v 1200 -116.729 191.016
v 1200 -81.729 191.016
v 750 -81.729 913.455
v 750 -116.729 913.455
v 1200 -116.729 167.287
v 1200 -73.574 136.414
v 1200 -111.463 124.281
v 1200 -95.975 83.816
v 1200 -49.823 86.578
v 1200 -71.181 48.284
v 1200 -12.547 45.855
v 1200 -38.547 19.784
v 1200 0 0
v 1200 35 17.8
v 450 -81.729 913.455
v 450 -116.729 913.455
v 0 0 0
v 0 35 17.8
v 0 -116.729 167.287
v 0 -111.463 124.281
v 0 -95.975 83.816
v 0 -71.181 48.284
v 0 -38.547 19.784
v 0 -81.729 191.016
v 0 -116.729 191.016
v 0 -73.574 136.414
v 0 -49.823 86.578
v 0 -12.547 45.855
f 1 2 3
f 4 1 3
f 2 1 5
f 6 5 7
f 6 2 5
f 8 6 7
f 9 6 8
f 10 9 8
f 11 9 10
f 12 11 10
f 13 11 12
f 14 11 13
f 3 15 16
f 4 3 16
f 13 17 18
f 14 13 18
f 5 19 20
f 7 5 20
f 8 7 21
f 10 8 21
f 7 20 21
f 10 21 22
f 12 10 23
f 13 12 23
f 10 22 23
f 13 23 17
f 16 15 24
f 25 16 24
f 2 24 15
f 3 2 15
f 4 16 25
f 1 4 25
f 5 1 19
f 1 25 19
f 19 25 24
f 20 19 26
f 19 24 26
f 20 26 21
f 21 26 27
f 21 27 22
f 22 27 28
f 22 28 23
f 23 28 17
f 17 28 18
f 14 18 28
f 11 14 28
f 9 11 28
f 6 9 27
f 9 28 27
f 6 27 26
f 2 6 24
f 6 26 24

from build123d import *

# Parameters (mm, degrees)
BOSS_EXTRUDE2_DEPTH = 1200
CUT_EXTRUDE2_DEPTH  = 1200


with BuildPart() as part:
    # Sketch4 → Boss-Extrude2 (new body)
    with BuildSketch(Plane(origin=(0, 0, 0), x_dir=(0, 0, -1), z_dir=(1, 0, 0))):
        with BuildLine():
            Line((-418.085663079, -116.728740424), (-167.287455413, -116.728740424))
            ThreePointArc((-167.287455413, -116.728740424), (-65.293961038, -84.661970634), (0, 0))
            Line((0, 0), (-17.8, 35))
            ThreePointArc((-17.8, 35), (-86.57752002, -49.822987688), (-191.015585124, -81.728740424))
            Line((-191.015585124, -81.728740424), (-418.085663079, -81.728740424))
            Line((-418.085663079, -81.728740424), (-913.455403633, -81.728740424))
            Line((-913.455403633, -81.728740424), (-913.455403633, -116.728740424))
            Line((-913.455403633, -116.728740424), (-418.085663079, -116.728740424))
        make_face()
    extrude(amount=BOSS_EXTRUDE2_DEPTH)

    # Sketch5 → Cut-Extrude2 (cut)
    with BuildSketch(Plane(origin=(0, -81.728740424, 0), x_dir=(1, 0, 0), z_dir=(0, 1, 0))):
        Polygon((0, -913.455403633), (450, -913.455403633), (0, -191.015585124), align=None)
        Polygon((1200, -191.015585124), (750, -913.455403633), (1200, -913.455403633), align=None)
    extrude(amount=-CUT_EXTRUDE2_DEPTH, mode=Mode.SUBTRACT)


solid = part.part
